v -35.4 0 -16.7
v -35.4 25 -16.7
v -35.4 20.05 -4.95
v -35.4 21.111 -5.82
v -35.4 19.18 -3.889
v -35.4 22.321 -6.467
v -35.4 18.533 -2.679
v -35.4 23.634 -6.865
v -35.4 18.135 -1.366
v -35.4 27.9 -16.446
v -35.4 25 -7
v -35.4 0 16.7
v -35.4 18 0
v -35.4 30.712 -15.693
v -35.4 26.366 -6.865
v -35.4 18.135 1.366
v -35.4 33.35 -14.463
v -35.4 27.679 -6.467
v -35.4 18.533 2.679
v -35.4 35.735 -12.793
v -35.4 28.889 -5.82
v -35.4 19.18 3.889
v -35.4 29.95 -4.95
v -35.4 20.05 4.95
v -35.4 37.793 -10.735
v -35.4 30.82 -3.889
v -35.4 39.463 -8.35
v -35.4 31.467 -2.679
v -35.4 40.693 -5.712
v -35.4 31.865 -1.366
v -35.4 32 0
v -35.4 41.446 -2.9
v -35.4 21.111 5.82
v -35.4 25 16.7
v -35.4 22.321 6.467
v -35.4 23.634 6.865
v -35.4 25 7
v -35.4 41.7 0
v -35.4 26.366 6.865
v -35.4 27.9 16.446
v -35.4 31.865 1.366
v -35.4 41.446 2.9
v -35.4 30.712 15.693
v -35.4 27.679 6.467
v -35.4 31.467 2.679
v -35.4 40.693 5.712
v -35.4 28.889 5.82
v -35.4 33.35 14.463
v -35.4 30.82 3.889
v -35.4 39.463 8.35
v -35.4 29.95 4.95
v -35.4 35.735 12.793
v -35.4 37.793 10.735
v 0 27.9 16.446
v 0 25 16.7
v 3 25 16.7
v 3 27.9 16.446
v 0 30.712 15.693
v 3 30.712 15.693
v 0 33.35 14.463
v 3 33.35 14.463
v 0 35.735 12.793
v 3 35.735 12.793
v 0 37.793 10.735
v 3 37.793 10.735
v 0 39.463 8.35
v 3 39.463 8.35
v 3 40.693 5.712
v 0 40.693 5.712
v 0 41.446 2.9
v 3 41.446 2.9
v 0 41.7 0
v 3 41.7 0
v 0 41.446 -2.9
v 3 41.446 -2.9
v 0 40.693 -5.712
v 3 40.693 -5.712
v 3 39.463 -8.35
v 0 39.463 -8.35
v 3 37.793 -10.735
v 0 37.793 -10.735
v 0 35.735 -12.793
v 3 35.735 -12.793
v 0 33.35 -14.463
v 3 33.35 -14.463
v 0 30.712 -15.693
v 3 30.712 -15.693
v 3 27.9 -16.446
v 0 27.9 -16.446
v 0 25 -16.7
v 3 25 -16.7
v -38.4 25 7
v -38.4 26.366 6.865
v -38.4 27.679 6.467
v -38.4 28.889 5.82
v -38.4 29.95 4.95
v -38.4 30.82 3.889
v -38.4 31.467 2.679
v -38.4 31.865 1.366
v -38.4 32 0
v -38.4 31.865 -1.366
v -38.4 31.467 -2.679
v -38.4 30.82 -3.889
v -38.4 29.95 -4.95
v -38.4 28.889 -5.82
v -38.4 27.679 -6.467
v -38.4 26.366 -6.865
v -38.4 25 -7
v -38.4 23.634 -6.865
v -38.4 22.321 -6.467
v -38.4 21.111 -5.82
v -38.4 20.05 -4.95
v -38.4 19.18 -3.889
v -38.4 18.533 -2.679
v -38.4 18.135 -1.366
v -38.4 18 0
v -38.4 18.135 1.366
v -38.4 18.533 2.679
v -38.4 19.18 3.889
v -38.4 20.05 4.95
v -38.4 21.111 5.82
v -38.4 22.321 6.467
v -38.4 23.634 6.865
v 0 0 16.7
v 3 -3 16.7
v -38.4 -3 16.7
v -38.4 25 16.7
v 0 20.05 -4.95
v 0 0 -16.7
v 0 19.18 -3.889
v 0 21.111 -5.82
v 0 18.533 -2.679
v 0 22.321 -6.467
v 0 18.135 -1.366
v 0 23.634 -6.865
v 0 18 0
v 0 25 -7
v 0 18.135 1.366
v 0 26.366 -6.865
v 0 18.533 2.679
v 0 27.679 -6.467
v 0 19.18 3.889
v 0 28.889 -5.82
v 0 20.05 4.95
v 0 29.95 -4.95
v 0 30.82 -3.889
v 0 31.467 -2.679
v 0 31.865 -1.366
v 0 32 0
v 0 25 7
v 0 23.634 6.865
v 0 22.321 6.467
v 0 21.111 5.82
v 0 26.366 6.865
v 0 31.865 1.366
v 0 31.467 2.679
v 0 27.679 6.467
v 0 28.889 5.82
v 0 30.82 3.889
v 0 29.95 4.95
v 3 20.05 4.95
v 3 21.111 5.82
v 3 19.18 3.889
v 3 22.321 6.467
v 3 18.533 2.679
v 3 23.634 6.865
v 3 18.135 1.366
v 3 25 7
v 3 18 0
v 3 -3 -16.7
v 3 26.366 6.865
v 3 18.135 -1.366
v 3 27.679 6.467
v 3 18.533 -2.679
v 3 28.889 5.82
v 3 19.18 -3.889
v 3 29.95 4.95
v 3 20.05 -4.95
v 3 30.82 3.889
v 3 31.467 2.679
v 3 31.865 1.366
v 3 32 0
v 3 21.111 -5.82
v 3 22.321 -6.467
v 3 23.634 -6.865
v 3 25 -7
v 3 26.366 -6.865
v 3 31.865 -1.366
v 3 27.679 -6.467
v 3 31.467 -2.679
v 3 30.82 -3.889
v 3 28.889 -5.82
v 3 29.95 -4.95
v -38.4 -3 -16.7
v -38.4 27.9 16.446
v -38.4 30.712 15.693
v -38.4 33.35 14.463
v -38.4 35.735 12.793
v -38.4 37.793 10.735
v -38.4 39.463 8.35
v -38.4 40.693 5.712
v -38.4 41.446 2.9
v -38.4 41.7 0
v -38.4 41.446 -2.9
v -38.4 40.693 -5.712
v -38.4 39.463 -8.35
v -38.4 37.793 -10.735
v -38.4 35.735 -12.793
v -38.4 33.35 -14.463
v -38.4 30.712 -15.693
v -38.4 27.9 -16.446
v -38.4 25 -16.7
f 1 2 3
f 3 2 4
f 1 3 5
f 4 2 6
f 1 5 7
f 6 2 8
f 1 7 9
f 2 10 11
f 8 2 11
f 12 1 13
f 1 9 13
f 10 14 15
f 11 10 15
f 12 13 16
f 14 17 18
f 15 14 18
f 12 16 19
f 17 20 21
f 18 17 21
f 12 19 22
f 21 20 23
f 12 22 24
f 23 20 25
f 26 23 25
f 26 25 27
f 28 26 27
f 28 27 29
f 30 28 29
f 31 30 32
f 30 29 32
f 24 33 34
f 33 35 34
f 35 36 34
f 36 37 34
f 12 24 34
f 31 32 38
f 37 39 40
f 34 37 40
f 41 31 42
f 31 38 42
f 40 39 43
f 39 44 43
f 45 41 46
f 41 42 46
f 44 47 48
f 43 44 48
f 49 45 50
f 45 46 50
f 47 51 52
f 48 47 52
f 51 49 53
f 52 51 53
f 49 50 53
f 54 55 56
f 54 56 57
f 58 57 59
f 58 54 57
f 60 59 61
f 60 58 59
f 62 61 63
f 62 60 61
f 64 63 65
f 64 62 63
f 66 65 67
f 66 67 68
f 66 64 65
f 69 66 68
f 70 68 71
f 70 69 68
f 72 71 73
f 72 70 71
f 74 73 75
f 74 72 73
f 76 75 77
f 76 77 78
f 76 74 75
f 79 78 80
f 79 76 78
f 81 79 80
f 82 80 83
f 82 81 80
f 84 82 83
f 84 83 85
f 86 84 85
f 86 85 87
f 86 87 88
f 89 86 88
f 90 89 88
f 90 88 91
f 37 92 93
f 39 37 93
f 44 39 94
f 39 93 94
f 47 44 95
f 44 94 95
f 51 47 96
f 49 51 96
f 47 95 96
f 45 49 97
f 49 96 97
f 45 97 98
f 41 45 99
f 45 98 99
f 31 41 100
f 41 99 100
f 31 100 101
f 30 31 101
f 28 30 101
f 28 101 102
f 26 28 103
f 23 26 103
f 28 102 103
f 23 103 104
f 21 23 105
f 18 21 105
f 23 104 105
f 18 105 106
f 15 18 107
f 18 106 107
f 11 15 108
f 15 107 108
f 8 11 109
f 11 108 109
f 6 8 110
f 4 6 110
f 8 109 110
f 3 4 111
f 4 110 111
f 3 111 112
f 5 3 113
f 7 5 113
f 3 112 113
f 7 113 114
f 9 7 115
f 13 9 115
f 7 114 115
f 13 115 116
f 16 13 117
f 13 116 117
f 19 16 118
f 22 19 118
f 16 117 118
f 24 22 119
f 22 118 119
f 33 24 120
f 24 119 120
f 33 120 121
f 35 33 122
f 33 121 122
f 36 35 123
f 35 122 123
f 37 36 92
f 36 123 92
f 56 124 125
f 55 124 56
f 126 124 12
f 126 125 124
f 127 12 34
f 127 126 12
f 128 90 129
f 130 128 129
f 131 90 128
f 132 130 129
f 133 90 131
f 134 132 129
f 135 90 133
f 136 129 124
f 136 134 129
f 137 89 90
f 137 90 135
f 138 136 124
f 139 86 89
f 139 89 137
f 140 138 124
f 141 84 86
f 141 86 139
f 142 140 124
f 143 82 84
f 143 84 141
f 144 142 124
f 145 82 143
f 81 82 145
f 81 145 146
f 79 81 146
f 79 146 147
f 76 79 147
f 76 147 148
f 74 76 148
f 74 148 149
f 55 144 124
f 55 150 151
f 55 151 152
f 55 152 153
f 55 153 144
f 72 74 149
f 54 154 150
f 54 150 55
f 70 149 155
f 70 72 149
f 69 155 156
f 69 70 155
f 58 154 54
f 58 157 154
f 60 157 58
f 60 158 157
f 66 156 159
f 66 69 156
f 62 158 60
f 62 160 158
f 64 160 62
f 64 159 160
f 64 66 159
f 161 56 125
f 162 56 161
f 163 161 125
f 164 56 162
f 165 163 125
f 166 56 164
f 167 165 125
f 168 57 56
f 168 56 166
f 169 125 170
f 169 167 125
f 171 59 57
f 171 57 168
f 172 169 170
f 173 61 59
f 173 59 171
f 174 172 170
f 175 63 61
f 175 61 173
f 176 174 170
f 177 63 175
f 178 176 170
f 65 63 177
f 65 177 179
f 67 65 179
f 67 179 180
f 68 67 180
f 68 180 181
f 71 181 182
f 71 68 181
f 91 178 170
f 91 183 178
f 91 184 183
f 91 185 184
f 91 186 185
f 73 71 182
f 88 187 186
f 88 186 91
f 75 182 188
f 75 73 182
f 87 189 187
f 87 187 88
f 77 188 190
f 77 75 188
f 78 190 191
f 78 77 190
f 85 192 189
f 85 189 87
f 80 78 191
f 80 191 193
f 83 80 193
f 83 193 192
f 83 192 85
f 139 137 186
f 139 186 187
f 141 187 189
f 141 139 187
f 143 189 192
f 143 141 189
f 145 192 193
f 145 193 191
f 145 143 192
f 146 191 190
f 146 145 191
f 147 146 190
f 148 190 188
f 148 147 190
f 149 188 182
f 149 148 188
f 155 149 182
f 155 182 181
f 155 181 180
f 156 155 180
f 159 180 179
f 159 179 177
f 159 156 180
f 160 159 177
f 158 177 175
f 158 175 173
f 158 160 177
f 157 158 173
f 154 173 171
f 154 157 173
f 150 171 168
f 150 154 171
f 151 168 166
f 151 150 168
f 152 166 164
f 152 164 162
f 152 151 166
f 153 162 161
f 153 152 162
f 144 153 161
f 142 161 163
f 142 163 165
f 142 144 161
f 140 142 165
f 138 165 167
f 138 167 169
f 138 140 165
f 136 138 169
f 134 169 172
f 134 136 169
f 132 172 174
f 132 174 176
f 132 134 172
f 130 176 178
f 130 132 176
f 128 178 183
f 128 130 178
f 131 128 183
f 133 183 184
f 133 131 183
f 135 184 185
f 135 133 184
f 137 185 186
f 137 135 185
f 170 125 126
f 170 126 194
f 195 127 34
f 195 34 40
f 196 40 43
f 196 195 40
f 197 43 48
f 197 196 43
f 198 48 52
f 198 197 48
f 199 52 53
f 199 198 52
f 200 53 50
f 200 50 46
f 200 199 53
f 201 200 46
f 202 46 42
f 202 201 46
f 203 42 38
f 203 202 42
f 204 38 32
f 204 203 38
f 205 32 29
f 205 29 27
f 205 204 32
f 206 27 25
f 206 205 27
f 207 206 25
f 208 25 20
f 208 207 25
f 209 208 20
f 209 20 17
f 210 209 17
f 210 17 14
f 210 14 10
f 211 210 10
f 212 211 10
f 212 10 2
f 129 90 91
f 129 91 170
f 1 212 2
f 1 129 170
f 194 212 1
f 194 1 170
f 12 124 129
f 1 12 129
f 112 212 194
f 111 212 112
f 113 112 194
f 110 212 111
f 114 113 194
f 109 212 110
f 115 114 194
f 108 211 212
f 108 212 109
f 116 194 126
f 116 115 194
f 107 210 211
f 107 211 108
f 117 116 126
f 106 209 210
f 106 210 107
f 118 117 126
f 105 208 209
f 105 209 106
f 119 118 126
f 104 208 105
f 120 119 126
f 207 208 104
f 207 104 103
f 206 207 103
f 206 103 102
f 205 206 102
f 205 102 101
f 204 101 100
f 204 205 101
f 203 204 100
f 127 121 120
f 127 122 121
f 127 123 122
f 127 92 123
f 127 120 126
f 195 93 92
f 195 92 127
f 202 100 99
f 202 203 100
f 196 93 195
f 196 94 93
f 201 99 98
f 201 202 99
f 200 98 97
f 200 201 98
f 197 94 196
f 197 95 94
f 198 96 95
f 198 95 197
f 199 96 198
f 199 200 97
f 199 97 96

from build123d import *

# Parameters (mm, degrees)
CROQUIS1_R              = 7.000000002
SALIENTE_EXTRUIR1_DEPTH = 3
CROQUIS2_W              = 33.4
CROQUIS2_H              = 3
SALIENTE_EXTRUIR2_DEPTH = 41.4
CROQUIS3_R              = 7.000000002
SALIENTE_EXTRUIR3_DEPTH = 3


with BuildPart() as part:
    # Croquis1 → Saliente-Extruir1 (new body)
    with BuildSketch(Plane(origin=(0, 0, 0), x_dir=(0, 0, -1), z_dir=(1, 0, 0))):
        with BuildLine():
            Line((16.7, 25), (16.7, 0))
            Line((16.7, 0), (-16.7, 0))
            Line((-16.7, 0), (-16.7, 25))
            ThreePointArc((-16.7, 25), (0, 41.7), (16.7, 25))
        make_face()
        with Locations((0, 25)):
            Circle(CROQUIS1_R, mode=Mode.SUBTRACT)
    extrude(amount=SALIENTE_EXTRUIR1_DEPTH)

    # Croquis2 → Saliente-Extruir2 (add)
    with BuildSketch(Plane(origin=(3, 0, 0), x_dir=(0, 0, -1), z_dir=(1, 0, 0))):
        with Locations((0, -1.5)):
            Rectangle(CROQUIS2_W, CROQUIS2_H)
    extrude(amount=-SALIENTE_EXTRUIR2_DEPTH)

    # Croquis3 → Saliente-Extruir3 (add)
    with BuildSketch(Plane.ZY.offset(38.4)):
        with BuildLine():
            Line((16.7, 0), (16.7, 25))
            ThreePointArc((16.7, 25), (0, 41.7), (-16.7, 25))
            Line((-16.7, 25), (-16.7, 0))
            Line((-16.7, 0), (16.7, 0))
        make_face()
        with Locations((0, 25)):
            Circle(CROQUIS3_R, mode=Mode.SUBTRACT)
    extrude(amount=-SALIENTE_EXTRUIR3_DEPTH)


solid = part.part
